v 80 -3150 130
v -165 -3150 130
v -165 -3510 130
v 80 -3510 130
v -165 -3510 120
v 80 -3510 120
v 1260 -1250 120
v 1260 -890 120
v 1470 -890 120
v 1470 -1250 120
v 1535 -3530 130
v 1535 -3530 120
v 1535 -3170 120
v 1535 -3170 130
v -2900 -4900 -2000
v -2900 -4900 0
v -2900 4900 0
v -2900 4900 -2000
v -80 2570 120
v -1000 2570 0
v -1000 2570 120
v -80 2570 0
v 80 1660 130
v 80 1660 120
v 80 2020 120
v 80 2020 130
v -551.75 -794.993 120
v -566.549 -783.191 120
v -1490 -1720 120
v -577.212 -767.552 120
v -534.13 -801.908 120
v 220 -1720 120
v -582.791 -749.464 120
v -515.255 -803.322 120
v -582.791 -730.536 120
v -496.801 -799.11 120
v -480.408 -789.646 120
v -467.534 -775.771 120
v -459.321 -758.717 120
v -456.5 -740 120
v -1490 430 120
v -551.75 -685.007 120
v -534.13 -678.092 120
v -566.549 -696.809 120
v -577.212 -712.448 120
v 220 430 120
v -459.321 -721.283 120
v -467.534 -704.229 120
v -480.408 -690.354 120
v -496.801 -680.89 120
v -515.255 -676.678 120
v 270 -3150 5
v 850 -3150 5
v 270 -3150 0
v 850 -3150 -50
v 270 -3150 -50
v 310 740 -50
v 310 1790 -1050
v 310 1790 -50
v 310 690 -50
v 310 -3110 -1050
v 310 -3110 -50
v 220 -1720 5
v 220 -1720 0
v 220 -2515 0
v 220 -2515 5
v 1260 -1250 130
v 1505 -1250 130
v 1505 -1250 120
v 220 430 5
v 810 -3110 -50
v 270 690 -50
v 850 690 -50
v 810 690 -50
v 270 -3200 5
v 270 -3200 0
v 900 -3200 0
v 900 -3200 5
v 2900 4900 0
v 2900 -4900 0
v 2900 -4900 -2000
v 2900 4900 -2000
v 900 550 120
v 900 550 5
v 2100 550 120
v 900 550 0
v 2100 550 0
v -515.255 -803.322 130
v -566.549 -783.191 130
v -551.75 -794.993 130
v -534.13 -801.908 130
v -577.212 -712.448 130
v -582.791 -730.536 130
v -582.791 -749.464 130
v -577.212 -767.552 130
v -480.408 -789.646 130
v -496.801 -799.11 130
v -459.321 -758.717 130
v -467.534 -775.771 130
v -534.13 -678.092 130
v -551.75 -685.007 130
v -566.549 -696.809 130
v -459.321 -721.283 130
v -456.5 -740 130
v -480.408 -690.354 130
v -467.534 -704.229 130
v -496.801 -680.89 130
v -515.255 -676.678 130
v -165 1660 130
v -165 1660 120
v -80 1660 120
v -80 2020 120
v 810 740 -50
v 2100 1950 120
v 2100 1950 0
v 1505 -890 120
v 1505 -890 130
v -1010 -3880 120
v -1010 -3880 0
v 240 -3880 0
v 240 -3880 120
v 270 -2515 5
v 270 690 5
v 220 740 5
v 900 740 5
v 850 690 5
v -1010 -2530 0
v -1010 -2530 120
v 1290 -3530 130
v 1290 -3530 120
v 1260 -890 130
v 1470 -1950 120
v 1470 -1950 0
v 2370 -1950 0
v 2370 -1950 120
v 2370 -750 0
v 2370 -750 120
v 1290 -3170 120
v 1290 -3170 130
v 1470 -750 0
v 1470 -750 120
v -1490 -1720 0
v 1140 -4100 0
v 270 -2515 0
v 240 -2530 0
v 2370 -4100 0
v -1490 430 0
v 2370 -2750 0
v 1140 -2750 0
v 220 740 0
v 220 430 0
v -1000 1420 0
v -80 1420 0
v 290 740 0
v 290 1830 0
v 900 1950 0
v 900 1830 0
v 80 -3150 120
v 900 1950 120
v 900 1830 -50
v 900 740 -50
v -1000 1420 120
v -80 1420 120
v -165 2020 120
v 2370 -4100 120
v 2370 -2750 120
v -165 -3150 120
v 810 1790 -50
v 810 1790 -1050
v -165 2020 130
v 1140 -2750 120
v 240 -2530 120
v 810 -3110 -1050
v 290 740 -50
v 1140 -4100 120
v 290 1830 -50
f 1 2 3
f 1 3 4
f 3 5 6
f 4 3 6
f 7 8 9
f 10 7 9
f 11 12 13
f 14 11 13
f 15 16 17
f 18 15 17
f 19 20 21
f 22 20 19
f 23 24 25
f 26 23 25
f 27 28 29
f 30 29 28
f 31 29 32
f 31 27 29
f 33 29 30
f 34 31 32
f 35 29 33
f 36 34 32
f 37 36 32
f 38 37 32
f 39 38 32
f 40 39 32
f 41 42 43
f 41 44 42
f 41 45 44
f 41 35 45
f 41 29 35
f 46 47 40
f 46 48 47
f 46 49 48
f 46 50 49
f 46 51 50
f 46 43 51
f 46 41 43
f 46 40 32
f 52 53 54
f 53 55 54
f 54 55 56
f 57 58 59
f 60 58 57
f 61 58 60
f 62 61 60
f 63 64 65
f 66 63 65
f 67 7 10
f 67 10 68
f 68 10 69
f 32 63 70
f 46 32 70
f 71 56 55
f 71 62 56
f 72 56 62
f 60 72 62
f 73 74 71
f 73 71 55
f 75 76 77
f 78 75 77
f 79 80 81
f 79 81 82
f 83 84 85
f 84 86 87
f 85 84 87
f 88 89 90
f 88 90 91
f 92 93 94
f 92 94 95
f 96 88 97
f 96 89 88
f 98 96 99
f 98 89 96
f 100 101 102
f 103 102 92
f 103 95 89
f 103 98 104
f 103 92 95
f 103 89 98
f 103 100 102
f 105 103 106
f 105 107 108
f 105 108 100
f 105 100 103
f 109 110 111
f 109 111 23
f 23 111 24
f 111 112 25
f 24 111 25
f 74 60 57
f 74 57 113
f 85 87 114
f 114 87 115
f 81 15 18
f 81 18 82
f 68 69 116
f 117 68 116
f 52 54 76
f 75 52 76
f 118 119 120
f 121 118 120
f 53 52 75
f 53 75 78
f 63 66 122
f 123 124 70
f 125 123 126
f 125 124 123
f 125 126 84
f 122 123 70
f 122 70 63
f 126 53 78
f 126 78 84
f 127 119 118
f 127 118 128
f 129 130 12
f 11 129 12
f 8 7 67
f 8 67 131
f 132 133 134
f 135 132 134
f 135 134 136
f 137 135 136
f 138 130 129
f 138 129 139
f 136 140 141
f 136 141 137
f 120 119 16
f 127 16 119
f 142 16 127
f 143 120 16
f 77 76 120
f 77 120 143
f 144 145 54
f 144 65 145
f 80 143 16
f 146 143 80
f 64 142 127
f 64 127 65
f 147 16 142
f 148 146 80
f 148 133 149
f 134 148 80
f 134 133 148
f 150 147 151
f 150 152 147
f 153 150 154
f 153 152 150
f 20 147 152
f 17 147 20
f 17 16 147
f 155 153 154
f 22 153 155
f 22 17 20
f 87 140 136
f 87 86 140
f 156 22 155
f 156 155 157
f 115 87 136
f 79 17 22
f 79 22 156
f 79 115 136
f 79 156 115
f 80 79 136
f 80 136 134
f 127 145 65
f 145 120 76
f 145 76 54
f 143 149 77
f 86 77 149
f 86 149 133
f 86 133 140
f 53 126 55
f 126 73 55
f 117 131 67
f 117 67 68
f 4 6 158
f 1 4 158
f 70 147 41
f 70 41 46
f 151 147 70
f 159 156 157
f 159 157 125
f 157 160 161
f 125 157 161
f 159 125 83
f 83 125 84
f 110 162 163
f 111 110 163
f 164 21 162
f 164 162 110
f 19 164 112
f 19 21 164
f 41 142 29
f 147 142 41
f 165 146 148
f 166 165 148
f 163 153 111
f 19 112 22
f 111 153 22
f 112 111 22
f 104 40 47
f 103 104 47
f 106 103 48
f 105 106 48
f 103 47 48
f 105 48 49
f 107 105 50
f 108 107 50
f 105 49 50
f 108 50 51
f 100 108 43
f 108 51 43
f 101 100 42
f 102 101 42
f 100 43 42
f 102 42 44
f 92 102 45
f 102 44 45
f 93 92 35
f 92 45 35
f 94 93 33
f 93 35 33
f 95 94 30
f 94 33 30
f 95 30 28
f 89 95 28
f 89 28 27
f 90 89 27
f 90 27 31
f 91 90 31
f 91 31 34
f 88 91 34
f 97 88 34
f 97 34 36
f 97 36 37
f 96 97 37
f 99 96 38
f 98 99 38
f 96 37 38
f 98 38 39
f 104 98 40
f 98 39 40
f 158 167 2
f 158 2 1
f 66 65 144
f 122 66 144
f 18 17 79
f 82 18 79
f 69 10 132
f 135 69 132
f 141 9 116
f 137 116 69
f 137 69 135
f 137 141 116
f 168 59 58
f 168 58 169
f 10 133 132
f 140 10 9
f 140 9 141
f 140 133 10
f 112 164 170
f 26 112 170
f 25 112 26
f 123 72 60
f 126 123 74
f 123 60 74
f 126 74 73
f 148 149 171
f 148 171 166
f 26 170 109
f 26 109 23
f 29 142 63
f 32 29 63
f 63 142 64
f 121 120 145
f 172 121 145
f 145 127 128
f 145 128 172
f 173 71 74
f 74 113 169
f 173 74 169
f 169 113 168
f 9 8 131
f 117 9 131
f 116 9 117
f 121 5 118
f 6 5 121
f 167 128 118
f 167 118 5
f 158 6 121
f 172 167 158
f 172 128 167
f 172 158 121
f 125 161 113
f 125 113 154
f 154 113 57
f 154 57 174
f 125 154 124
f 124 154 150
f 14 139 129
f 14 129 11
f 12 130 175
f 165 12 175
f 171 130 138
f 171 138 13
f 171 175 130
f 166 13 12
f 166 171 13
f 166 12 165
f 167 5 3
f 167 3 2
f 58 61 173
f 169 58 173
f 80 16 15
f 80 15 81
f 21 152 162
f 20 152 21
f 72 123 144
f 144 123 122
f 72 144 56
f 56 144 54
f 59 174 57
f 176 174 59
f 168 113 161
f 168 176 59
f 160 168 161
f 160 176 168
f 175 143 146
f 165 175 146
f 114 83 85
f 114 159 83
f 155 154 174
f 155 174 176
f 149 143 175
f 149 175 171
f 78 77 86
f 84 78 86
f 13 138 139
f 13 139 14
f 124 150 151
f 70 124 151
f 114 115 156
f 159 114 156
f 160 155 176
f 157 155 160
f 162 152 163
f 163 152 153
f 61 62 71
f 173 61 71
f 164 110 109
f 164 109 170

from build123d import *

# Parameters (mm, degrees)
F0_W      = 5800
F0_H      = 9800
F1_DEPTH  = 2000
F2_W      = 920
F2_H      = 1150
F2_W_2    = 900
F2_H_2    = 1200
F2_W_3    = 1230
F2_H_3    = 1350
F2_W_4    = 1710
F2_H_4    = 2150
F2_W_5    = 1250
F3_DEPTH  = 120
F4_DEPTH  = 5
F5_W      = 610
F5_H      = 1090
F6_DEPTH  = 50
F7_W      = 500
F7_H      = 1010
F8_DEPTH  = 1000
F9_W      = 500
F9_H      = 1000
F10_DEPTH = 290
F11_W     = 245
F11_H     = 360
F11_R     = 63.5
F12_DEPTH = 10


with BuildPart() as f1:
    # F0 (on Top) → F1 (new body)
    with BuildSketch(Plane.XY):
        Rectangle(F0_W, F0_H)
    extrude(amount=-F1_DEPTH)

    # F2 (on face) → F3 (join)
    with BuildSketch(Plane.XY):
        with Locations((-540, 1995)):
            Rectangle(F2_W, F2_H)
        with Locations((1920, -1350)):
            Rectangle(F2_W_2, F2_H_2)
        with Locations((1755, -3425)):
            Rectangle(F2_W_3, F2_H_3)
        with Locations((-635, -645)):
            Rectangle(F2_W_4, F2_H_4)
        with Locations((-385, -3205)):
            Rectangle(F2_W_5, F2_H_3)
        Polygon((900, 550), (2100, 550), (2100, 1950), (900, 1950), (900, 1830), (900, 740), align=None)
    extrude(amount=F3_DEPTH)

    # F2 (on face) → F4 (join)
    with BuildSketch(Plane.XY):
        Polygon((900, -3200), (900, 550), (900, 740), (290, 740), (220, 740), (220, 430), (220, -1720), (220, -2515), (270, -2515), (270, 690), (850, 690), (850, -3150), (270, -3150), (270, -3200), align=None)
    extrude(amount=F4_DEPTH)

    # F5 (on face) → F6 (cut)
    with BuildSketch(Plane.XY):
        Polygon((850, 690), (270, 690), (270, -2515), (270, -3150), (850, -3150), align=None)
        with Locations((595, 1285)):
            Rectangle(F5_W, F5_H)
    extrude(amount=-F6_DEPTH, mode=Mode.SUBTRACT)

    # F7 (on face) → F8 (cut)
    with BuildSketch(Plane.XY.offset(-50)):
        Polygon((810, 650), (310, 650), (310, -2515), (310, -3110), (810, -3110), align=None)
        with Locations((560, 1285)):
            Rectangle(F7_W, F7_H)
    extrude(amount=-F8_DEPTH, mode=Mode.SUBTRACT)

    # F9 (on face) → F10 (cut)
    with BuildSketch(Plane.XZ.offset(-650)):
        with Locations((560, -550)):
            Rectangle(F9_W, F9_H)
    extrude(amount=-F10_DEPTH, mode=Mode.SUBTRACT)

    # F11 (on face) → F12 (join)
    with BuildSketch(Plane.XY.offset(120)):
        with Locations((-42.5, 1840)):
            Rectangle(F11_W, F11_H)
        with Locations((-520, -740)):
            Circle(F11_R)
        with Locations((-42.5, -3330)):
            Rectangle(F11_W, F11_H)
        with Locations((1412.5, -3350)):
            Rectangle(F11_W, F11_H)
        with Locations((1382.5, -1070)):
            Rectangle(F11_W, F11_H)
    extrude(amount=F12_DEPTH)


solid = f1.part
